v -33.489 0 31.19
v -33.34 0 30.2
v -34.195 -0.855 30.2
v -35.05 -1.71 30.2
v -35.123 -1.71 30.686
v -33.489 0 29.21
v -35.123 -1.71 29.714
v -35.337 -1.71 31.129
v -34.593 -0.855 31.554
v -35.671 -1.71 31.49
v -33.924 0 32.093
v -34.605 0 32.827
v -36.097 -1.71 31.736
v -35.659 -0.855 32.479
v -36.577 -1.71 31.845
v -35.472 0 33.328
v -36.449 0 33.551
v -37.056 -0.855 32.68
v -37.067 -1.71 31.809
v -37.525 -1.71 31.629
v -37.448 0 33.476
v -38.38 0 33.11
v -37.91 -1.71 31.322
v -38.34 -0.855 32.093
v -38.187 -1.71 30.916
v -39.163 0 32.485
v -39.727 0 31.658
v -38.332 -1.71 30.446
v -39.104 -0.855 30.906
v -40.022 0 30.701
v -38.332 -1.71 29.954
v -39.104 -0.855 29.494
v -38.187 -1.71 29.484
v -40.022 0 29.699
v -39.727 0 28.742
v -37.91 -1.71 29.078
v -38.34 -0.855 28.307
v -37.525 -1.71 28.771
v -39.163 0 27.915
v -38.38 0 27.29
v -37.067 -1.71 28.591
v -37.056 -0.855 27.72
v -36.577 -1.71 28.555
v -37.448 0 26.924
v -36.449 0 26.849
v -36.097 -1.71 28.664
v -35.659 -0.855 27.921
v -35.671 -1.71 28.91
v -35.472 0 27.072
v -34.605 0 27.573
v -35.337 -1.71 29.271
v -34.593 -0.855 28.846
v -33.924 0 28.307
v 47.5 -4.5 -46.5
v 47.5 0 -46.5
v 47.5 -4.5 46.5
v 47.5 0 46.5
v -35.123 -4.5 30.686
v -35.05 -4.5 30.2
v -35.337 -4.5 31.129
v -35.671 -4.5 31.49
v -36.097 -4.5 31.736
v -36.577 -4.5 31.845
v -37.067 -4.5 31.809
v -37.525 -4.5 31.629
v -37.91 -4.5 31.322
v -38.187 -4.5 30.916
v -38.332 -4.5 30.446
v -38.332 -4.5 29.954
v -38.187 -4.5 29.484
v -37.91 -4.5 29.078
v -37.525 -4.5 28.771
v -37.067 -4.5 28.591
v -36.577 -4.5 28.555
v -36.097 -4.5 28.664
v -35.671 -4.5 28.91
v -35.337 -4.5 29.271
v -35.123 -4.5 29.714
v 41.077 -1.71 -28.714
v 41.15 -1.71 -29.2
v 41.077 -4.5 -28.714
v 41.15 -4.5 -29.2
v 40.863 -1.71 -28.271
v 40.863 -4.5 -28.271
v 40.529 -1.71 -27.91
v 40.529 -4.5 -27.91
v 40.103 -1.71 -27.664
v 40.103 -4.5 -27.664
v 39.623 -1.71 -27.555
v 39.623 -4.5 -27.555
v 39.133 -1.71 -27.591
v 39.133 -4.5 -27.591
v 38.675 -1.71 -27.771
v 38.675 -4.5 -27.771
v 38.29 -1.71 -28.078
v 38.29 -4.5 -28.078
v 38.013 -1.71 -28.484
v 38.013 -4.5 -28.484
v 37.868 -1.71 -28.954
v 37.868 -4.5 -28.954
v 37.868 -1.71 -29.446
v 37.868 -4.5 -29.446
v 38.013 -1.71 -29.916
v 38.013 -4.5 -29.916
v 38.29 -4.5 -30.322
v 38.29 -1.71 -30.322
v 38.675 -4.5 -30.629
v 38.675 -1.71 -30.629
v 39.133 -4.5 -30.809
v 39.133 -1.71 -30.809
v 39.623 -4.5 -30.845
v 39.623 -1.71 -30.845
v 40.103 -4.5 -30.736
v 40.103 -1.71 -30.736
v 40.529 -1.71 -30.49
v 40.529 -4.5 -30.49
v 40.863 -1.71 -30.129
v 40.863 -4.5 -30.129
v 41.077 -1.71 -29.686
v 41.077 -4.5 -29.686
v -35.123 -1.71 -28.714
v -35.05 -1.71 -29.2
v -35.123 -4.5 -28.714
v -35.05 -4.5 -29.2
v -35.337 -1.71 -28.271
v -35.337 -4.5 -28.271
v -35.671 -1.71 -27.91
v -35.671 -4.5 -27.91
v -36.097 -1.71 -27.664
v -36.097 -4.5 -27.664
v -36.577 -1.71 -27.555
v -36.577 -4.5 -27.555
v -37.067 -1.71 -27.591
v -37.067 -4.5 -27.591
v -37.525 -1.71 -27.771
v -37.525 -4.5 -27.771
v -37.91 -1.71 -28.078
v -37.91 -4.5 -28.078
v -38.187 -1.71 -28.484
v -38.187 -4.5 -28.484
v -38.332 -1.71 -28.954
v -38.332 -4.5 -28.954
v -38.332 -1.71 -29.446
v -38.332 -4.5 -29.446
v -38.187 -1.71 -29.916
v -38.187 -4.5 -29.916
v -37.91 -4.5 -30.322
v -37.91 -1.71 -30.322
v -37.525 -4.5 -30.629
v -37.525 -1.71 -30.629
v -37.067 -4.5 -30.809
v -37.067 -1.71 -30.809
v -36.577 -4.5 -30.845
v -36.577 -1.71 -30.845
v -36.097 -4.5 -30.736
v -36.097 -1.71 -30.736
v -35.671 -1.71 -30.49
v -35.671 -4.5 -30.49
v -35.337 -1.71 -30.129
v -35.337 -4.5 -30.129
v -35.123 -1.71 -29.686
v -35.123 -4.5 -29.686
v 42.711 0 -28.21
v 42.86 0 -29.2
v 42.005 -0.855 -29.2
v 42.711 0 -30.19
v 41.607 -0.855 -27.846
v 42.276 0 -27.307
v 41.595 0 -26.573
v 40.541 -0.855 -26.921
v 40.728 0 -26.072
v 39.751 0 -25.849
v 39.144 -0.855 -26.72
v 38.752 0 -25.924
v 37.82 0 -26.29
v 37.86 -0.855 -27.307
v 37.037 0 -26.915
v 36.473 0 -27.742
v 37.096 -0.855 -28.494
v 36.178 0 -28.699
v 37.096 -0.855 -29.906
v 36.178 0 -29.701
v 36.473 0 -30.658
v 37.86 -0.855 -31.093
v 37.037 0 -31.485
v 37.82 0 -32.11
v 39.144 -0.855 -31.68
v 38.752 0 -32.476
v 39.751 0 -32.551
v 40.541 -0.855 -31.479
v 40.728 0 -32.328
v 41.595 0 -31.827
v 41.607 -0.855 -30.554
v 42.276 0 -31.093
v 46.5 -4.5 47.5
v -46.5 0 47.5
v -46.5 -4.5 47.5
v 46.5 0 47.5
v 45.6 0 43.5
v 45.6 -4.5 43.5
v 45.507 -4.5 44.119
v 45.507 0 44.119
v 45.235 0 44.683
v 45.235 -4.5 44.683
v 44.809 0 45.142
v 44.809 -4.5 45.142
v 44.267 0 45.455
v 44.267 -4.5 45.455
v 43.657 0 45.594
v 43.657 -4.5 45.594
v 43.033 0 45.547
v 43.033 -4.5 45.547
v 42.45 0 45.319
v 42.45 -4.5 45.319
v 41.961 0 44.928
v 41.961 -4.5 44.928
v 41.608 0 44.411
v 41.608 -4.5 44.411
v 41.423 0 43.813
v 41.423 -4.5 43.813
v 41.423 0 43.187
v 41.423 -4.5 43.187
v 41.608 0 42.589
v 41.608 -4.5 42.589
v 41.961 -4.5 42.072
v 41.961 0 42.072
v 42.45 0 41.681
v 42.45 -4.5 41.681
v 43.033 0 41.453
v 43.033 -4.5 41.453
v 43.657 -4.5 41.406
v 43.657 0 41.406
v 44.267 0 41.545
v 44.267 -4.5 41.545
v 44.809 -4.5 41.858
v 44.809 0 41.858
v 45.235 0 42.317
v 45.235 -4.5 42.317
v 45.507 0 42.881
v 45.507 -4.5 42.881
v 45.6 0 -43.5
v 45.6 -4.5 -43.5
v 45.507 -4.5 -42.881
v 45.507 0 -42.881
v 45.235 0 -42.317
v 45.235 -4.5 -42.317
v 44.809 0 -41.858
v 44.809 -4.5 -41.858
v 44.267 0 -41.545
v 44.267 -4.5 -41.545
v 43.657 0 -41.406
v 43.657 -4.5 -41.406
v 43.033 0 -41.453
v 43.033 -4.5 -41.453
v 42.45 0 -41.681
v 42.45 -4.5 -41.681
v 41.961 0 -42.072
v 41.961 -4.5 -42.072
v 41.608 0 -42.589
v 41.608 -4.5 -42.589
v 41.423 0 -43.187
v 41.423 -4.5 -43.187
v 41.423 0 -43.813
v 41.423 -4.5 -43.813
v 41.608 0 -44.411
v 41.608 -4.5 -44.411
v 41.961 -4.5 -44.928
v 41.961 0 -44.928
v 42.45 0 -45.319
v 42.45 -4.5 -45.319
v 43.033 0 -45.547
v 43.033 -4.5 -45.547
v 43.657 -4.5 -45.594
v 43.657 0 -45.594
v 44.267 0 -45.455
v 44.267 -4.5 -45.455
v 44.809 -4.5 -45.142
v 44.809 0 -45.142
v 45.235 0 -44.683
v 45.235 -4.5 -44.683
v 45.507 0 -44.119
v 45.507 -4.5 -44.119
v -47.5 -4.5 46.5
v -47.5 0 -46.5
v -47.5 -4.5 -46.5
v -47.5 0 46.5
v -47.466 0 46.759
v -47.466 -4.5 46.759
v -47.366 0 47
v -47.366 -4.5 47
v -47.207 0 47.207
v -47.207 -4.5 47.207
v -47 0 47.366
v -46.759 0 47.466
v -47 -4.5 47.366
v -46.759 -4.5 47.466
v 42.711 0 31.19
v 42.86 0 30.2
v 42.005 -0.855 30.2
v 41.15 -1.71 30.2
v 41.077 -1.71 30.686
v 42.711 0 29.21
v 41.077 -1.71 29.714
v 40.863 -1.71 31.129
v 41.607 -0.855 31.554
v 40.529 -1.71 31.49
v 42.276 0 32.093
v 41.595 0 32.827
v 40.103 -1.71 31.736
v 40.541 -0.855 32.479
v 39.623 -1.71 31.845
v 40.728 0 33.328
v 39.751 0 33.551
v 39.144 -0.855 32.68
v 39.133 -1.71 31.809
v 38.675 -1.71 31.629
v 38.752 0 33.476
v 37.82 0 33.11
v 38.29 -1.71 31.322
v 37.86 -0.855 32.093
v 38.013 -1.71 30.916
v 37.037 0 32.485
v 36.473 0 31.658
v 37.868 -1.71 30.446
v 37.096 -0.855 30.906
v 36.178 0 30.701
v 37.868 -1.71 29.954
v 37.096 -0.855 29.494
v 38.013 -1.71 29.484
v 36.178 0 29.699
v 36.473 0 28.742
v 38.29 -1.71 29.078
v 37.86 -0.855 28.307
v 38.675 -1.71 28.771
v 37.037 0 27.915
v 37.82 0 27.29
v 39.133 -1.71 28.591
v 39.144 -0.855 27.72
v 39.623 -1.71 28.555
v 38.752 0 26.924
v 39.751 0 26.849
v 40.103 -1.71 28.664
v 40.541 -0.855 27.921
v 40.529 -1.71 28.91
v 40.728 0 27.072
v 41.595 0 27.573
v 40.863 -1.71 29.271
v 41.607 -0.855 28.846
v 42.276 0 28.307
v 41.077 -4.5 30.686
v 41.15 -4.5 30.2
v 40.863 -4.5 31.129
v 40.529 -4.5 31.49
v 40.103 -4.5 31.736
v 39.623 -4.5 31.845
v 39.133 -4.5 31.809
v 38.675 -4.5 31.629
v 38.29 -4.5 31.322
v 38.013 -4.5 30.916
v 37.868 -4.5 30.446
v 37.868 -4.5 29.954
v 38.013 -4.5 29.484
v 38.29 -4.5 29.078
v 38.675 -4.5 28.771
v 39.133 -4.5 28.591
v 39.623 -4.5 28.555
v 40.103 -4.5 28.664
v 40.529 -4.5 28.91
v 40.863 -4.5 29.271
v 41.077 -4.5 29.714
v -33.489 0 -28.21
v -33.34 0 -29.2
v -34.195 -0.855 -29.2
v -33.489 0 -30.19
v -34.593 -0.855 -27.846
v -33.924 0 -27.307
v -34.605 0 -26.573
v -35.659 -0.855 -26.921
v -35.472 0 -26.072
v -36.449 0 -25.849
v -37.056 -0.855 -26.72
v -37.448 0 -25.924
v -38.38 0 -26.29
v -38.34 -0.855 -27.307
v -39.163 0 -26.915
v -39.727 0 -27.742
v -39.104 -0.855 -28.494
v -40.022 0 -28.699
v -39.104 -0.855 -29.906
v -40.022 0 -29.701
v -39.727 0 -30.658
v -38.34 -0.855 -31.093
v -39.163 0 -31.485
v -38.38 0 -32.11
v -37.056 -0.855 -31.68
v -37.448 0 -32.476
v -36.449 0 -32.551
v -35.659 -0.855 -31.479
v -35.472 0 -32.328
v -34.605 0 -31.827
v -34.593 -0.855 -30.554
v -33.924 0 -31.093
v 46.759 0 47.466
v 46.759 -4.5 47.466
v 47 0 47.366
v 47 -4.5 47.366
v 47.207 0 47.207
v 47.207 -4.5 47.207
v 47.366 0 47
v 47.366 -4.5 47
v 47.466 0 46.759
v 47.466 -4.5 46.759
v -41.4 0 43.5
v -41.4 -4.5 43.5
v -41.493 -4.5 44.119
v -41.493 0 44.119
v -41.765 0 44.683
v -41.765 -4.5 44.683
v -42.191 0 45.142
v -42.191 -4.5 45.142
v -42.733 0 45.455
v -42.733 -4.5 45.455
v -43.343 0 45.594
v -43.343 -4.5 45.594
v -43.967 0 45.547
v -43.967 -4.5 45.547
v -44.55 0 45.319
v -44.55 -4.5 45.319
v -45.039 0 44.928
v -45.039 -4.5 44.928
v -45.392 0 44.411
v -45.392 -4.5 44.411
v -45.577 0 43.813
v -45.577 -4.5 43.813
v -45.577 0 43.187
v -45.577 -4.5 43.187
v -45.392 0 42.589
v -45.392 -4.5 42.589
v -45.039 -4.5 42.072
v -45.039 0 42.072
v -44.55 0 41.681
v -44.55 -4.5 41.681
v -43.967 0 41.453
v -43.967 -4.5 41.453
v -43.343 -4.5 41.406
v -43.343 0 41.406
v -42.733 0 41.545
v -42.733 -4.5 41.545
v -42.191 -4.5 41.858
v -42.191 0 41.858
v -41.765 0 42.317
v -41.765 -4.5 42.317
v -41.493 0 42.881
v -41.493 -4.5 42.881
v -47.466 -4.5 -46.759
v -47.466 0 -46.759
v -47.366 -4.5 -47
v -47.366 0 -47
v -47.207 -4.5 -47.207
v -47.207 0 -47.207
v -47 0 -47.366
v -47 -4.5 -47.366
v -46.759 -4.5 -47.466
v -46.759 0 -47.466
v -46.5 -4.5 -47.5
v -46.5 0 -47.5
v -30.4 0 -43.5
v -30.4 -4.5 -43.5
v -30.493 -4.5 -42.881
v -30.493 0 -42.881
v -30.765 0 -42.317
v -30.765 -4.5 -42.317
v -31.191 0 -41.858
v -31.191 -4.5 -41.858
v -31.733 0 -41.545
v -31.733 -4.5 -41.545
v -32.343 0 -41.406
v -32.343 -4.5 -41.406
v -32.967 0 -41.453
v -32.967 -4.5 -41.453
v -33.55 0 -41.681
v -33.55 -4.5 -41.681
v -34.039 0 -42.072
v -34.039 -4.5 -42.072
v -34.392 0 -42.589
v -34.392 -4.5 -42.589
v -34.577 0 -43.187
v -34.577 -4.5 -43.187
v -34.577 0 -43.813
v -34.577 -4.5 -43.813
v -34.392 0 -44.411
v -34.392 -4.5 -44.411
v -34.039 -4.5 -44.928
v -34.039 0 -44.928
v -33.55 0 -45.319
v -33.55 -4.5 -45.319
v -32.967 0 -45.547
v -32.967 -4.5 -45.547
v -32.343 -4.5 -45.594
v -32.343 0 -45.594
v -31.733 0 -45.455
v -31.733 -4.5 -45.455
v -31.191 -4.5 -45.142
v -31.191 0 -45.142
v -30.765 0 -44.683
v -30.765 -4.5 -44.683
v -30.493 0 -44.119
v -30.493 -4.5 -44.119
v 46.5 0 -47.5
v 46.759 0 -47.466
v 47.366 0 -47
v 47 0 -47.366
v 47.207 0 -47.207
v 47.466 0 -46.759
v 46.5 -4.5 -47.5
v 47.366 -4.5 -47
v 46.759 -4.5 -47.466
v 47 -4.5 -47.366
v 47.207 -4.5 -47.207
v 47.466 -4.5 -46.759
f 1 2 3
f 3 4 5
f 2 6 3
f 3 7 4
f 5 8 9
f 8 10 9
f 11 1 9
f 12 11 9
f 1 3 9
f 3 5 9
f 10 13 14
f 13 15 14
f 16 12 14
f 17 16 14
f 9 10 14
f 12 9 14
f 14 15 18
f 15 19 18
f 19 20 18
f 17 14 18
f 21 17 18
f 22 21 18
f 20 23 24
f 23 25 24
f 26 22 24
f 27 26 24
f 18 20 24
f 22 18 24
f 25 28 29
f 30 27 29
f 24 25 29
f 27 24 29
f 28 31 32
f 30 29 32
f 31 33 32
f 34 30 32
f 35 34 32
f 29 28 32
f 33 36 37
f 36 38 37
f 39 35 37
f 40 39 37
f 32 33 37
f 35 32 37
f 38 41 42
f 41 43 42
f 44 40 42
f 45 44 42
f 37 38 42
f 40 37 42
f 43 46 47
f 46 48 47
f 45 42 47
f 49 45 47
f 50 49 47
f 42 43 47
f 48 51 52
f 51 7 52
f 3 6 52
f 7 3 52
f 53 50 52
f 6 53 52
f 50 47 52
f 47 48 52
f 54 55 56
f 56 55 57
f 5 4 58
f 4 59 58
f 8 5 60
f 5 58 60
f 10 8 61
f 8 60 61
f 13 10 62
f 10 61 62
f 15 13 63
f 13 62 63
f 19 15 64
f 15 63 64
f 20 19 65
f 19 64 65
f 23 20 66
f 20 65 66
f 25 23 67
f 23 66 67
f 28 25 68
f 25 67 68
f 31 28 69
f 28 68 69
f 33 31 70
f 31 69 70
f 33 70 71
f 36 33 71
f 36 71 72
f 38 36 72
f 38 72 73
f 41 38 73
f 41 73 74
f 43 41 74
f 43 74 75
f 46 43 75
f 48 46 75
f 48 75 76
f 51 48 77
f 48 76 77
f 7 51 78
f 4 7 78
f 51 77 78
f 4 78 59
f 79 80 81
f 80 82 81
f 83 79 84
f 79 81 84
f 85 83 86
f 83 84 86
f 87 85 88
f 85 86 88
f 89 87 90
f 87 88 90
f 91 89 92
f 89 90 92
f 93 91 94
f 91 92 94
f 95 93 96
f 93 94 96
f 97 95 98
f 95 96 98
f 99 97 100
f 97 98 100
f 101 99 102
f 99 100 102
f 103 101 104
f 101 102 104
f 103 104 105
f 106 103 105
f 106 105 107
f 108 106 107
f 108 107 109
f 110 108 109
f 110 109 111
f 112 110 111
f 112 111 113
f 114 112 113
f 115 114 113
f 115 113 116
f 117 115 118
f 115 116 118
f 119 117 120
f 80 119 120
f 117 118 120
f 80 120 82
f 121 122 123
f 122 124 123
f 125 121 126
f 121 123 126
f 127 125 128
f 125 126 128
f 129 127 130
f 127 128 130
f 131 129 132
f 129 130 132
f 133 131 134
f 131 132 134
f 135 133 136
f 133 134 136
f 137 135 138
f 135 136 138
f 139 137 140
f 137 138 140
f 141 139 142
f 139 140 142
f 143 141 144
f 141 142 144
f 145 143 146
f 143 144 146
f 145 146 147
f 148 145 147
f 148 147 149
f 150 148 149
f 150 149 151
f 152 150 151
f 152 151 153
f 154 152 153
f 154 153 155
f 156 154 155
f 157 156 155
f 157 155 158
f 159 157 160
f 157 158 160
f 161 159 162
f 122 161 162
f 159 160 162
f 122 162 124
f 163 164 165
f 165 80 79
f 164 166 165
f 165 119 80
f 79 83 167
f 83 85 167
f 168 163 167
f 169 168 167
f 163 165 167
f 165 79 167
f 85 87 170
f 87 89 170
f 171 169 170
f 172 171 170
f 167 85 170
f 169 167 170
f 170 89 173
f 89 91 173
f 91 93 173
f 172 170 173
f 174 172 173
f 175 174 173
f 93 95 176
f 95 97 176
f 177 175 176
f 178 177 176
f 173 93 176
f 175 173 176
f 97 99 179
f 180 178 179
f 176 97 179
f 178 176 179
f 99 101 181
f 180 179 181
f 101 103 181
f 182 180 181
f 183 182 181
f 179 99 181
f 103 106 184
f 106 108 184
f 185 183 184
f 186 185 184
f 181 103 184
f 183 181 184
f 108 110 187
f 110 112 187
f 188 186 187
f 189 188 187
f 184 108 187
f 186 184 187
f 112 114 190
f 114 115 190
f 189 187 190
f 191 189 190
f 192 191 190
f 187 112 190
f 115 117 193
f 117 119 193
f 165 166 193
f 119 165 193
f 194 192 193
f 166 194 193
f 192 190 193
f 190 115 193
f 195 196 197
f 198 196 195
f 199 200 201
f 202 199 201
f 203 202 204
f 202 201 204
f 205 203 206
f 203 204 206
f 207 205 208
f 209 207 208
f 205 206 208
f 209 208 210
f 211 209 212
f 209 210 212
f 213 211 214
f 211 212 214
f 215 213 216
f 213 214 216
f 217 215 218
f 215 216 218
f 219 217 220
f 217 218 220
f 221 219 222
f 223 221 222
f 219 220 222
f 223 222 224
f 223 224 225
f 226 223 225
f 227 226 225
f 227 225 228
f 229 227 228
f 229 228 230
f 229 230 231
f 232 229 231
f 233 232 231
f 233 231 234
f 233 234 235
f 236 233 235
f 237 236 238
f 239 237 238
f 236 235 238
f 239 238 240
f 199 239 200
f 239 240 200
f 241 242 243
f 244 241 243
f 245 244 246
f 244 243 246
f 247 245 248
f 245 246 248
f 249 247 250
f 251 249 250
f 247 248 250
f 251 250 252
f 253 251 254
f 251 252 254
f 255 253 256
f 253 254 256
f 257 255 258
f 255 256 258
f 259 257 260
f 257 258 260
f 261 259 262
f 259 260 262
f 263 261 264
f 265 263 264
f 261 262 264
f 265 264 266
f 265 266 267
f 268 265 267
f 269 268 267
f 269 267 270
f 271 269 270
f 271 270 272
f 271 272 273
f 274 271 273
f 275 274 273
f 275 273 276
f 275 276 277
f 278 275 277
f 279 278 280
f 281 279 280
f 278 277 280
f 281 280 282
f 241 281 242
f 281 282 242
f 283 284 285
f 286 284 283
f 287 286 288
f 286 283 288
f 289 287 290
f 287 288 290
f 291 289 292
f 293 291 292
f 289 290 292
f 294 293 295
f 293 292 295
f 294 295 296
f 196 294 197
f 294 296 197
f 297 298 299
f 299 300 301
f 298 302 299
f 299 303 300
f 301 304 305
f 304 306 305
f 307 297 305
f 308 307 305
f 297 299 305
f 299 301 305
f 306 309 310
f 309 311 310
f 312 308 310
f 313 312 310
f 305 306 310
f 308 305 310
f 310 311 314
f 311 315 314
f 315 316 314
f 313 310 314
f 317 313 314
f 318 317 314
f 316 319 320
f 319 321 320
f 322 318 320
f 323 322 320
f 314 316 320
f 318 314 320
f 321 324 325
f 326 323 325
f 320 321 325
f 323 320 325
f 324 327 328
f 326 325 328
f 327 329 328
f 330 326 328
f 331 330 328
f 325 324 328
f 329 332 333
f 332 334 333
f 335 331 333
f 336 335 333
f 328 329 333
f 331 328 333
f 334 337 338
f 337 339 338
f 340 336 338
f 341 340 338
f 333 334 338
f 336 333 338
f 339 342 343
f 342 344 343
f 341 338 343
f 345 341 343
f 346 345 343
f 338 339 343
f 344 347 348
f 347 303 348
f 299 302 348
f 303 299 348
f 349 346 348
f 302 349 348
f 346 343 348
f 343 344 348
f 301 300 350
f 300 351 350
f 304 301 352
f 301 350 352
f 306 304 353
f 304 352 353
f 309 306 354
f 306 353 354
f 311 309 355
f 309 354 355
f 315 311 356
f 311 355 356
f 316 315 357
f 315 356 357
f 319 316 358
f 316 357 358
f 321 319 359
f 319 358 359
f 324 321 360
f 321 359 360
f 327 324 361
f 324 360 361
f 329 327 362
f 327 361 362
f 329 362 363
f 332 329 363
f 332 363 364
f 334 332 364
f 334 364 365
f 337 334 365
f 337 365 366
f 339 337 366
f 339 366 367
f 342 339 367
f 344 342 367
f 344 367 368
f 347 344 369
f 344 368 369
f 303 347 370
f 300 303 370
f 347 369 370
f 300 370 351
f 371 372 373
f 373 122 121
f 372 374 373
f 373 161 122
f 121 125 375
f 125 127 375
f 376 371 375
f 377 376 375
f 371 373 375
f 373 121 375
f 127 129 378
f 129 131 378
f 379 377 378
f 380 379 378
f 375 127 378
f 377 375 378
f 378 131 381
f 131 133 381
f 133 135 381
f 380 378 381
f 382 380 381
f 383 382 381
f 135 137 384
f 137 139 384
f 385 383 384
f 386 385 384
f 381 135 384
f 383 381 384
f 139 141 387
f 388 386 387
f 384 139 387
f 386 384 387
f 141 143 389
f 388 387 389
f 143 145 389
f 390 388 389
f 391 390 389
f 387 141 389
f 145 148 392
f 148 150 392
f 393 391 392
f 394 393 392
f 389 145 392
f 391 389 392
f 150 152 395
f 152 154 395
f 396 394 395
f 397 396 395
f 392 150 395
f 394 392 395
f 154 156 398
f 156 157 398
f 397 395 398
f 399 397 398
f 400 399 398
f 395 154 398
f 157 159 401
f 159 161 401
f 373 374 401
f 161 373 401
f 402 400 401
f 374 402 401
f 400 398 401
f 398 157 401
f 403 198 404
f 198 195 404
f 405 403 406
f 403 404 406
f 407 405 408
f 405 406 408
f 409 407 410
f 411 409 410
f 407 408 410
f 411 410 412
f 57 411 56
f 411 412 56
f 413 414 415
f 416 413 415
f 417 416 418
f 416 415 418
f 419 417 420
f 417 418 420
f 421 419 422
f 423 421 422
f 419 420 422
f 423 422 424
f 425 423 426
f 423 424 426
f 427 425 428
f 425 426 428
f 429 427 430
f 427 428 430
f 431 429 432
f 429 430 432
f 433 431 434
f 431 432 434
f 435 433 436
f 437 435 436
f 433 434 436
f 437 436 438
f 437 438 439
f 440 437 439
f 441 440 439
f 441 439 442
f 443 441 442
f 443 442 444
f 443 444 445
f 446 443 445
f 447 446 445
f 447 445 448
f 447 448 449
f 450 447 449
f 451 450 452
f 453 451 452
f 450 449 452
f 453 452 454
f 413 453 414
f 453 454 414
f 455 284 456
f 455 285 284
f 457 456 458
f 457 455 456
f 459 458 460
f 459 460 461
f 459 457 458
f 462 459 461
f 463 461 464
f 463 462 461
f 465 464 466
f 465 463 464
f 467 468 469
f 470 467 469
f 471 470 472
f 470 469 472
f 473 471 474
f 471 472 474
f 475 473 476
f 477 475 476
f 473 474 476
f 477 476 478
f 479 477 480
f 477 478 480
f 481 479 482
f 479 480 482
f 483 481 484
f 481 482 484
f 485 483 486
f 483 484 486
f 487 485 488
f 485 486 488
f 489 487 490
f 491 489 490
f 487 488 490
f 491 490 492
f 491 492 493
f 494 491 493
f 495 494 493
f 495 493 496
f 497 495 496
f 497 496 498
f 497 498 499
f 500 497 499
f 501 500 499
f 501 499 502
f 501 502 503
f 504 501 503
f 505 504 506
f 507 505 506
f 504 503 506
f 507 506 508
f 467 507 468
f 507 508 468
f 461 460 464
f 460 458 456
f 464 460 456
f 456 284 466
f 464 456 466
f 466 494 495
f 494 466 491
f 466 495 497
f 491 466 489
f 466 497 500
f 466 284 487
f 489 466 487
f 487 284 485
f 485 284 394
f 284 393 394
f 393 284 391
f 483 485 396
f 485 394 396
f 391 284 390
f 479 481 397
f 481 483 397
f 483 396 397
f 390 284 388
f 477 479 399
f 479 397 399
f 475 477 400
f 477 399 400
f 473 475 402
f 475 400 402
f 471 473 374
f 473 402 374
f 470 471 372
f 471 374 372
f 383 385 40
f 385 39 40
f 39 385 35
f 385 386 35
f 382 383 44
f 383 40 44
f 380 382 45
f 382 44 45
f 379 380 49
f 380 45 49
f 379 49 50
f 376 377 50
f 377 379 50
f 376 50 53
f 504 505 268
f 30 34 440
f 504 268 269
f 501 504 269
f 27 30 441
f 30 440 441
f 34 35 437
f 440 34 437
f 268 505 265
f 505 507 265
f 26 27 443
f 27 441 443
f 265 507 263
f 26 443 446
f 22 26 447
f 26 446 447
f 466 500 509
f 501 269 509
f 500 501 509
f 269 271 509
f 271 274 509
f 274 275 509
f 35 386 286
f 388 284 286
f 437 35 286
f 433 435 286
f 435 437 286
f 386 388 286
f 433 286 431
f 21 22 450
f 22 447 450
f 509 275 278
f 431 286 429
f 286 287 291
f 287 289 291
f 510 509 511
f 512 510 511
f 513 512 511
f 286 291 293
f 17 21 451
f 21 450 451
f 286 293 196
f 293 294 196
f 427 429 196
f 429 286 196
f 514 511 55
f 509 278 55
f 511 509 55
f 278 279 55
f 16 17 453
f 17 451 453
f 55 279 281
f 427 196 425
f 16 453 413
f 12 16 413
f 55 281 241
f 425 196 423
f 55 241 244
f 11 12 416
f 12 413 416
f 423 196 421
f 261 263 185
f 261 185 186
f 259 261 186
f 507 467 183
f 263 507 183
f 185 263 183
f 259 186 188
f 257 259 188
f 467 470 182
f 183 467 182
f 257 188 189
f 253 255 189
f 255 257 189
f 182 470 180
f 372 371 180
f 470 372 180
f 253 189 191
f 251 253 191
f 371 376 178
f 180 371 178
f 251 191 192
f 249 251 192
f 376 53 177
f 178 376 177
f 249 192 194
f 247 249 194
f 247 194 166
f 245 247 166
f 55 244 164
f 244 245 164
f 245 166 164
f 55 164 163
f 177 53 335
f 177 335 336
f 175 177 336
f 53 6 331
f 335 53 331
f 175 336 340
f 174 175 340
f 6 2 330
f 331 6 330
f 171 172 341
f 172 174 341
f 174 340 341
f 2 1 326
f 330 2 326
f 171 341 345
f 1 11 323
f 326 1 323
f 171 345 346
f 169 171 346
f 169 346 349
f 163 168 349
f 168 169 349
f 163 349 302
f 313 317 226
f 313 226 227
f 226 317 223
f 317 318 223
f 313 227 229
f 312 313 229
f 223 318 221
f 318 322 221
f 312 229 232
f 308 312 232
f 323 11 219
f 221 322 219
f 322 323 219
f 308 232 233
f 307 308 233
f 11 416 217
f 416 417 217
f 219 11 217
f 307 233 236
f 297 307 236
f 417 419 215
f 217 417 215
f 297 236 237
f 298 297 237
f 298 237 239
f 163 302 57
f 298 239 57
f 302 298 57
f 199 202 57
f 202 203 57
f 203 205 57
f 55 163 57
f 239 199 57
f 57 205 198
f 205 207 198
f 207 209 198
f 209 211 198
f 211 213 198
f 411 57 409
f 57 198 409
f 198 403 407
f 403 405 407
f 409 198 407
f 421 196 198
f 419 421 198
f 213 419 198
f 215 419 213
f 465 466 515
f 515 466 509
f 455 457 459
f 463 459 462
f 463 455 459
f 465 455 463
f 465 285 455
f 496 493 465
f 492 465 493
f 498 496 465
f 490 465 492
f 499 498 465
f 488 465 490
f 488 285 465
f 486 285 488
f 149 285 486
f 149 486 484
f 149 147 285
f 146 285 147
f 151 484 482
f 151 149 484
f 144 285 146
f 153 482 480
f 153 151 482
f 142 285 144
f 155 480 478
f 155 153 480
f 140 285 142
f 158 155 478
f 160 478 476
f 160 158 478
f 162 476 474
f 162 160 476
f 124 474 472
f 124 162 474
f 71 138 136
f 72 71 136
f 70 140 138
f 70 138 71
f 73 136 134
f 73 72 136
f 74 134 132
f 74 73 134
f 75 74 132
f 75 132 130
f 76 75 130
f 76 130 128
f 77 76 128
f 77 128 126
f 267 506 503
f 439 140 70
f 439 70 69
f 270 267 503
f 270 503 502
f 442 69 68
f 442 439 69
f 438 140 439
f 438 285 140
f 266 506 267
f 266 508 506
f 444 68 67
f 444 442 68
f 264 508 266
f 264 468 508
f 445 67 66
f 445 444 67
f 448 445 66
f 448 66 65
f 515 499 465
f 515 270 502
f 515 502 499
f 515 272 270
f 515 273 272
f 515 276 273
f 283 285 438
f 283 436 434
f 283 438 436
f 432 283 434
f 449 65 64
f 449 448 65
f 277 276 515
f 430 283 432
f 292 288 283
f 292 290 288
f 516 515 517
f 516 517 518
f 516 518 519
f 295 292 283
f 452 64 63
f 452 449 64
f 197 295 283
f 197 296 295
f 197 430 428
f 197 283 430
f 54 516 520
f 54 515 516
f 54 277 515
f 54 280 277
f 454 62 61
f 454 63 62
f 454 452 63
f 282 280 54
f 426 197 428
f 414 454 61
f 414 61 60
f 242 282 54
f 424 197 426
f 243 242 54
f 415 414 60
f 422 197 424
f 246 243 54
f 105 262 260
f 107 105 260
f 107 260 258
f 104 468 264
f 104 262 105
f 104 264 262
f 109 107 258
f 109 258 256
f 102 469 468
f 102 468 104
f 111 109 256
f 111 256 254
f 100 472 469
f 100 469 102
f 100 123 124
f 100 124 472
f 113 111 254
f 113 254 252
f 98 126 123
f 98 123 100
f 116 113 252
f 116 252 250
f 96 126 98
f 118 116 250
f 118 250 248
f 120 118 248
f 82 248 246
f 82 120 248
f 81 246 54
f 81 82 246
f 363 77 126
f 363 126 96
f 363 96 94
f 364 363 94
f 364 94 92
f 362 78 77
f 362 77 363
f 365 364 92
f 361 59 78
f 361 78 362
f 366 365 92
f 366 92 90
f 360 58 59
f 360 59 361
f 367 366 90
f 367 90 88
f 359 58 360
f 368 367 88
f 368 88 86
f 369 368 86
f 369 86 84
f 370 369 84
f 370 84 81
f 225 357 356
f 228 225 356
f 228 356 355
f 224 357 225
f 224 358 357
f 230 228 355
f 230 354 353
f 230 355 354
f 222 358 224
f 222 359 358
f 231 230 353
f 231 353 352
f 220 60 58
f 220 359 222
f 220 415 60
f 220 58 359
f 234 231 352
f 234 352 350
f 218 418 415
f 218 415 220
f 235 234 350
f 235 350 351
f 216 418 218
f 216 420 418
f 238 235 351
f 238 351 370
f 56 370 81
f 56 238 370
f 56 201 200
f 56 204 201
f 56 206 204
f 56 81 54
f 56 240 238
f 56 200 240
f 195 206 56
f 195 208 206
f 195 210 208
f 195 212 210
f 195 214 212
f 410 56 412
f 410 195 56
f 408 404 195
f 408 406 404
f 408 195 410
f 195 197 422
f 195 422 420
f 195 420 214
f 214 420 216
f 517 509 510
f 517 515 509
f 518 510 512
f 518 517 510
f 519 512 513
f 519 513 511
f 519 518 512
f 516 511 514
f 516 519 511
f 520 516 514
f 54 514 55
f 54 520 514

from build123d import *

# Parameters (mm, degrees)
F0_W           = 95
F0_H           = 95
F1_DEPTH       = 4.5
F2_R           = 2.1
F3_DEPTH       = 4.5
F4_R           = 1
F6_D           = 3.3
F6_CSINK_D     = 6.72
F6_CSINK_ANGLE = 90


with BuildPart() as f1:
    # F0 (on Front) → F1 (new body)
    with BuildSketch(Plane.XZ):
        Rectangle(F0_W, F0_H)
    extrude(amount=F1_DEPTH)

    # F2 (on face) → F3 (cut, through all)
    with BuildSketch(Plane.XZ.offset(4.5)):
        with Locations((43.5, 43.5)):
            Circle(F2_R)
        with Locations((43.5, -43.5)):
            Circle(F2_R)
        with Locations((-32.5, -43.5)):
            Circle(F2_R)
        with Locations((-43.5, 43.5)):
            Circle(F2_R)
    extrude(amount=-F3_DEPTH, mode=Mode.SUBTRACT)

    # F4
    f4_edges = [f1.edges().sort_by_distance(p)[0] for p in [
        (-47.5, -2.25, 47.5),
        (47.5, -2.25, 47.5),
        (47.5, -2.25, -47.5),
        (-47.5, -2.25, -47.5),
    ]]
    fillet(f4_edges, radius=F4_R)

    # F6 (through all)
    with Locations(Plane(origin=(0, 0, 0), x_dir=(-1, 0, 0), z_dir=(0, 1, 0))):
        with Locations((-39.5, 30.2), (36.7, 30.2), (36.7, -29.2), (-39.5, -29.2)):
            CounterSinkHole(F6_D / 2, F6_CSINK_D / 2, counter_sink_angle=F6_CSINK_ANGLE)


solid = f1.part
